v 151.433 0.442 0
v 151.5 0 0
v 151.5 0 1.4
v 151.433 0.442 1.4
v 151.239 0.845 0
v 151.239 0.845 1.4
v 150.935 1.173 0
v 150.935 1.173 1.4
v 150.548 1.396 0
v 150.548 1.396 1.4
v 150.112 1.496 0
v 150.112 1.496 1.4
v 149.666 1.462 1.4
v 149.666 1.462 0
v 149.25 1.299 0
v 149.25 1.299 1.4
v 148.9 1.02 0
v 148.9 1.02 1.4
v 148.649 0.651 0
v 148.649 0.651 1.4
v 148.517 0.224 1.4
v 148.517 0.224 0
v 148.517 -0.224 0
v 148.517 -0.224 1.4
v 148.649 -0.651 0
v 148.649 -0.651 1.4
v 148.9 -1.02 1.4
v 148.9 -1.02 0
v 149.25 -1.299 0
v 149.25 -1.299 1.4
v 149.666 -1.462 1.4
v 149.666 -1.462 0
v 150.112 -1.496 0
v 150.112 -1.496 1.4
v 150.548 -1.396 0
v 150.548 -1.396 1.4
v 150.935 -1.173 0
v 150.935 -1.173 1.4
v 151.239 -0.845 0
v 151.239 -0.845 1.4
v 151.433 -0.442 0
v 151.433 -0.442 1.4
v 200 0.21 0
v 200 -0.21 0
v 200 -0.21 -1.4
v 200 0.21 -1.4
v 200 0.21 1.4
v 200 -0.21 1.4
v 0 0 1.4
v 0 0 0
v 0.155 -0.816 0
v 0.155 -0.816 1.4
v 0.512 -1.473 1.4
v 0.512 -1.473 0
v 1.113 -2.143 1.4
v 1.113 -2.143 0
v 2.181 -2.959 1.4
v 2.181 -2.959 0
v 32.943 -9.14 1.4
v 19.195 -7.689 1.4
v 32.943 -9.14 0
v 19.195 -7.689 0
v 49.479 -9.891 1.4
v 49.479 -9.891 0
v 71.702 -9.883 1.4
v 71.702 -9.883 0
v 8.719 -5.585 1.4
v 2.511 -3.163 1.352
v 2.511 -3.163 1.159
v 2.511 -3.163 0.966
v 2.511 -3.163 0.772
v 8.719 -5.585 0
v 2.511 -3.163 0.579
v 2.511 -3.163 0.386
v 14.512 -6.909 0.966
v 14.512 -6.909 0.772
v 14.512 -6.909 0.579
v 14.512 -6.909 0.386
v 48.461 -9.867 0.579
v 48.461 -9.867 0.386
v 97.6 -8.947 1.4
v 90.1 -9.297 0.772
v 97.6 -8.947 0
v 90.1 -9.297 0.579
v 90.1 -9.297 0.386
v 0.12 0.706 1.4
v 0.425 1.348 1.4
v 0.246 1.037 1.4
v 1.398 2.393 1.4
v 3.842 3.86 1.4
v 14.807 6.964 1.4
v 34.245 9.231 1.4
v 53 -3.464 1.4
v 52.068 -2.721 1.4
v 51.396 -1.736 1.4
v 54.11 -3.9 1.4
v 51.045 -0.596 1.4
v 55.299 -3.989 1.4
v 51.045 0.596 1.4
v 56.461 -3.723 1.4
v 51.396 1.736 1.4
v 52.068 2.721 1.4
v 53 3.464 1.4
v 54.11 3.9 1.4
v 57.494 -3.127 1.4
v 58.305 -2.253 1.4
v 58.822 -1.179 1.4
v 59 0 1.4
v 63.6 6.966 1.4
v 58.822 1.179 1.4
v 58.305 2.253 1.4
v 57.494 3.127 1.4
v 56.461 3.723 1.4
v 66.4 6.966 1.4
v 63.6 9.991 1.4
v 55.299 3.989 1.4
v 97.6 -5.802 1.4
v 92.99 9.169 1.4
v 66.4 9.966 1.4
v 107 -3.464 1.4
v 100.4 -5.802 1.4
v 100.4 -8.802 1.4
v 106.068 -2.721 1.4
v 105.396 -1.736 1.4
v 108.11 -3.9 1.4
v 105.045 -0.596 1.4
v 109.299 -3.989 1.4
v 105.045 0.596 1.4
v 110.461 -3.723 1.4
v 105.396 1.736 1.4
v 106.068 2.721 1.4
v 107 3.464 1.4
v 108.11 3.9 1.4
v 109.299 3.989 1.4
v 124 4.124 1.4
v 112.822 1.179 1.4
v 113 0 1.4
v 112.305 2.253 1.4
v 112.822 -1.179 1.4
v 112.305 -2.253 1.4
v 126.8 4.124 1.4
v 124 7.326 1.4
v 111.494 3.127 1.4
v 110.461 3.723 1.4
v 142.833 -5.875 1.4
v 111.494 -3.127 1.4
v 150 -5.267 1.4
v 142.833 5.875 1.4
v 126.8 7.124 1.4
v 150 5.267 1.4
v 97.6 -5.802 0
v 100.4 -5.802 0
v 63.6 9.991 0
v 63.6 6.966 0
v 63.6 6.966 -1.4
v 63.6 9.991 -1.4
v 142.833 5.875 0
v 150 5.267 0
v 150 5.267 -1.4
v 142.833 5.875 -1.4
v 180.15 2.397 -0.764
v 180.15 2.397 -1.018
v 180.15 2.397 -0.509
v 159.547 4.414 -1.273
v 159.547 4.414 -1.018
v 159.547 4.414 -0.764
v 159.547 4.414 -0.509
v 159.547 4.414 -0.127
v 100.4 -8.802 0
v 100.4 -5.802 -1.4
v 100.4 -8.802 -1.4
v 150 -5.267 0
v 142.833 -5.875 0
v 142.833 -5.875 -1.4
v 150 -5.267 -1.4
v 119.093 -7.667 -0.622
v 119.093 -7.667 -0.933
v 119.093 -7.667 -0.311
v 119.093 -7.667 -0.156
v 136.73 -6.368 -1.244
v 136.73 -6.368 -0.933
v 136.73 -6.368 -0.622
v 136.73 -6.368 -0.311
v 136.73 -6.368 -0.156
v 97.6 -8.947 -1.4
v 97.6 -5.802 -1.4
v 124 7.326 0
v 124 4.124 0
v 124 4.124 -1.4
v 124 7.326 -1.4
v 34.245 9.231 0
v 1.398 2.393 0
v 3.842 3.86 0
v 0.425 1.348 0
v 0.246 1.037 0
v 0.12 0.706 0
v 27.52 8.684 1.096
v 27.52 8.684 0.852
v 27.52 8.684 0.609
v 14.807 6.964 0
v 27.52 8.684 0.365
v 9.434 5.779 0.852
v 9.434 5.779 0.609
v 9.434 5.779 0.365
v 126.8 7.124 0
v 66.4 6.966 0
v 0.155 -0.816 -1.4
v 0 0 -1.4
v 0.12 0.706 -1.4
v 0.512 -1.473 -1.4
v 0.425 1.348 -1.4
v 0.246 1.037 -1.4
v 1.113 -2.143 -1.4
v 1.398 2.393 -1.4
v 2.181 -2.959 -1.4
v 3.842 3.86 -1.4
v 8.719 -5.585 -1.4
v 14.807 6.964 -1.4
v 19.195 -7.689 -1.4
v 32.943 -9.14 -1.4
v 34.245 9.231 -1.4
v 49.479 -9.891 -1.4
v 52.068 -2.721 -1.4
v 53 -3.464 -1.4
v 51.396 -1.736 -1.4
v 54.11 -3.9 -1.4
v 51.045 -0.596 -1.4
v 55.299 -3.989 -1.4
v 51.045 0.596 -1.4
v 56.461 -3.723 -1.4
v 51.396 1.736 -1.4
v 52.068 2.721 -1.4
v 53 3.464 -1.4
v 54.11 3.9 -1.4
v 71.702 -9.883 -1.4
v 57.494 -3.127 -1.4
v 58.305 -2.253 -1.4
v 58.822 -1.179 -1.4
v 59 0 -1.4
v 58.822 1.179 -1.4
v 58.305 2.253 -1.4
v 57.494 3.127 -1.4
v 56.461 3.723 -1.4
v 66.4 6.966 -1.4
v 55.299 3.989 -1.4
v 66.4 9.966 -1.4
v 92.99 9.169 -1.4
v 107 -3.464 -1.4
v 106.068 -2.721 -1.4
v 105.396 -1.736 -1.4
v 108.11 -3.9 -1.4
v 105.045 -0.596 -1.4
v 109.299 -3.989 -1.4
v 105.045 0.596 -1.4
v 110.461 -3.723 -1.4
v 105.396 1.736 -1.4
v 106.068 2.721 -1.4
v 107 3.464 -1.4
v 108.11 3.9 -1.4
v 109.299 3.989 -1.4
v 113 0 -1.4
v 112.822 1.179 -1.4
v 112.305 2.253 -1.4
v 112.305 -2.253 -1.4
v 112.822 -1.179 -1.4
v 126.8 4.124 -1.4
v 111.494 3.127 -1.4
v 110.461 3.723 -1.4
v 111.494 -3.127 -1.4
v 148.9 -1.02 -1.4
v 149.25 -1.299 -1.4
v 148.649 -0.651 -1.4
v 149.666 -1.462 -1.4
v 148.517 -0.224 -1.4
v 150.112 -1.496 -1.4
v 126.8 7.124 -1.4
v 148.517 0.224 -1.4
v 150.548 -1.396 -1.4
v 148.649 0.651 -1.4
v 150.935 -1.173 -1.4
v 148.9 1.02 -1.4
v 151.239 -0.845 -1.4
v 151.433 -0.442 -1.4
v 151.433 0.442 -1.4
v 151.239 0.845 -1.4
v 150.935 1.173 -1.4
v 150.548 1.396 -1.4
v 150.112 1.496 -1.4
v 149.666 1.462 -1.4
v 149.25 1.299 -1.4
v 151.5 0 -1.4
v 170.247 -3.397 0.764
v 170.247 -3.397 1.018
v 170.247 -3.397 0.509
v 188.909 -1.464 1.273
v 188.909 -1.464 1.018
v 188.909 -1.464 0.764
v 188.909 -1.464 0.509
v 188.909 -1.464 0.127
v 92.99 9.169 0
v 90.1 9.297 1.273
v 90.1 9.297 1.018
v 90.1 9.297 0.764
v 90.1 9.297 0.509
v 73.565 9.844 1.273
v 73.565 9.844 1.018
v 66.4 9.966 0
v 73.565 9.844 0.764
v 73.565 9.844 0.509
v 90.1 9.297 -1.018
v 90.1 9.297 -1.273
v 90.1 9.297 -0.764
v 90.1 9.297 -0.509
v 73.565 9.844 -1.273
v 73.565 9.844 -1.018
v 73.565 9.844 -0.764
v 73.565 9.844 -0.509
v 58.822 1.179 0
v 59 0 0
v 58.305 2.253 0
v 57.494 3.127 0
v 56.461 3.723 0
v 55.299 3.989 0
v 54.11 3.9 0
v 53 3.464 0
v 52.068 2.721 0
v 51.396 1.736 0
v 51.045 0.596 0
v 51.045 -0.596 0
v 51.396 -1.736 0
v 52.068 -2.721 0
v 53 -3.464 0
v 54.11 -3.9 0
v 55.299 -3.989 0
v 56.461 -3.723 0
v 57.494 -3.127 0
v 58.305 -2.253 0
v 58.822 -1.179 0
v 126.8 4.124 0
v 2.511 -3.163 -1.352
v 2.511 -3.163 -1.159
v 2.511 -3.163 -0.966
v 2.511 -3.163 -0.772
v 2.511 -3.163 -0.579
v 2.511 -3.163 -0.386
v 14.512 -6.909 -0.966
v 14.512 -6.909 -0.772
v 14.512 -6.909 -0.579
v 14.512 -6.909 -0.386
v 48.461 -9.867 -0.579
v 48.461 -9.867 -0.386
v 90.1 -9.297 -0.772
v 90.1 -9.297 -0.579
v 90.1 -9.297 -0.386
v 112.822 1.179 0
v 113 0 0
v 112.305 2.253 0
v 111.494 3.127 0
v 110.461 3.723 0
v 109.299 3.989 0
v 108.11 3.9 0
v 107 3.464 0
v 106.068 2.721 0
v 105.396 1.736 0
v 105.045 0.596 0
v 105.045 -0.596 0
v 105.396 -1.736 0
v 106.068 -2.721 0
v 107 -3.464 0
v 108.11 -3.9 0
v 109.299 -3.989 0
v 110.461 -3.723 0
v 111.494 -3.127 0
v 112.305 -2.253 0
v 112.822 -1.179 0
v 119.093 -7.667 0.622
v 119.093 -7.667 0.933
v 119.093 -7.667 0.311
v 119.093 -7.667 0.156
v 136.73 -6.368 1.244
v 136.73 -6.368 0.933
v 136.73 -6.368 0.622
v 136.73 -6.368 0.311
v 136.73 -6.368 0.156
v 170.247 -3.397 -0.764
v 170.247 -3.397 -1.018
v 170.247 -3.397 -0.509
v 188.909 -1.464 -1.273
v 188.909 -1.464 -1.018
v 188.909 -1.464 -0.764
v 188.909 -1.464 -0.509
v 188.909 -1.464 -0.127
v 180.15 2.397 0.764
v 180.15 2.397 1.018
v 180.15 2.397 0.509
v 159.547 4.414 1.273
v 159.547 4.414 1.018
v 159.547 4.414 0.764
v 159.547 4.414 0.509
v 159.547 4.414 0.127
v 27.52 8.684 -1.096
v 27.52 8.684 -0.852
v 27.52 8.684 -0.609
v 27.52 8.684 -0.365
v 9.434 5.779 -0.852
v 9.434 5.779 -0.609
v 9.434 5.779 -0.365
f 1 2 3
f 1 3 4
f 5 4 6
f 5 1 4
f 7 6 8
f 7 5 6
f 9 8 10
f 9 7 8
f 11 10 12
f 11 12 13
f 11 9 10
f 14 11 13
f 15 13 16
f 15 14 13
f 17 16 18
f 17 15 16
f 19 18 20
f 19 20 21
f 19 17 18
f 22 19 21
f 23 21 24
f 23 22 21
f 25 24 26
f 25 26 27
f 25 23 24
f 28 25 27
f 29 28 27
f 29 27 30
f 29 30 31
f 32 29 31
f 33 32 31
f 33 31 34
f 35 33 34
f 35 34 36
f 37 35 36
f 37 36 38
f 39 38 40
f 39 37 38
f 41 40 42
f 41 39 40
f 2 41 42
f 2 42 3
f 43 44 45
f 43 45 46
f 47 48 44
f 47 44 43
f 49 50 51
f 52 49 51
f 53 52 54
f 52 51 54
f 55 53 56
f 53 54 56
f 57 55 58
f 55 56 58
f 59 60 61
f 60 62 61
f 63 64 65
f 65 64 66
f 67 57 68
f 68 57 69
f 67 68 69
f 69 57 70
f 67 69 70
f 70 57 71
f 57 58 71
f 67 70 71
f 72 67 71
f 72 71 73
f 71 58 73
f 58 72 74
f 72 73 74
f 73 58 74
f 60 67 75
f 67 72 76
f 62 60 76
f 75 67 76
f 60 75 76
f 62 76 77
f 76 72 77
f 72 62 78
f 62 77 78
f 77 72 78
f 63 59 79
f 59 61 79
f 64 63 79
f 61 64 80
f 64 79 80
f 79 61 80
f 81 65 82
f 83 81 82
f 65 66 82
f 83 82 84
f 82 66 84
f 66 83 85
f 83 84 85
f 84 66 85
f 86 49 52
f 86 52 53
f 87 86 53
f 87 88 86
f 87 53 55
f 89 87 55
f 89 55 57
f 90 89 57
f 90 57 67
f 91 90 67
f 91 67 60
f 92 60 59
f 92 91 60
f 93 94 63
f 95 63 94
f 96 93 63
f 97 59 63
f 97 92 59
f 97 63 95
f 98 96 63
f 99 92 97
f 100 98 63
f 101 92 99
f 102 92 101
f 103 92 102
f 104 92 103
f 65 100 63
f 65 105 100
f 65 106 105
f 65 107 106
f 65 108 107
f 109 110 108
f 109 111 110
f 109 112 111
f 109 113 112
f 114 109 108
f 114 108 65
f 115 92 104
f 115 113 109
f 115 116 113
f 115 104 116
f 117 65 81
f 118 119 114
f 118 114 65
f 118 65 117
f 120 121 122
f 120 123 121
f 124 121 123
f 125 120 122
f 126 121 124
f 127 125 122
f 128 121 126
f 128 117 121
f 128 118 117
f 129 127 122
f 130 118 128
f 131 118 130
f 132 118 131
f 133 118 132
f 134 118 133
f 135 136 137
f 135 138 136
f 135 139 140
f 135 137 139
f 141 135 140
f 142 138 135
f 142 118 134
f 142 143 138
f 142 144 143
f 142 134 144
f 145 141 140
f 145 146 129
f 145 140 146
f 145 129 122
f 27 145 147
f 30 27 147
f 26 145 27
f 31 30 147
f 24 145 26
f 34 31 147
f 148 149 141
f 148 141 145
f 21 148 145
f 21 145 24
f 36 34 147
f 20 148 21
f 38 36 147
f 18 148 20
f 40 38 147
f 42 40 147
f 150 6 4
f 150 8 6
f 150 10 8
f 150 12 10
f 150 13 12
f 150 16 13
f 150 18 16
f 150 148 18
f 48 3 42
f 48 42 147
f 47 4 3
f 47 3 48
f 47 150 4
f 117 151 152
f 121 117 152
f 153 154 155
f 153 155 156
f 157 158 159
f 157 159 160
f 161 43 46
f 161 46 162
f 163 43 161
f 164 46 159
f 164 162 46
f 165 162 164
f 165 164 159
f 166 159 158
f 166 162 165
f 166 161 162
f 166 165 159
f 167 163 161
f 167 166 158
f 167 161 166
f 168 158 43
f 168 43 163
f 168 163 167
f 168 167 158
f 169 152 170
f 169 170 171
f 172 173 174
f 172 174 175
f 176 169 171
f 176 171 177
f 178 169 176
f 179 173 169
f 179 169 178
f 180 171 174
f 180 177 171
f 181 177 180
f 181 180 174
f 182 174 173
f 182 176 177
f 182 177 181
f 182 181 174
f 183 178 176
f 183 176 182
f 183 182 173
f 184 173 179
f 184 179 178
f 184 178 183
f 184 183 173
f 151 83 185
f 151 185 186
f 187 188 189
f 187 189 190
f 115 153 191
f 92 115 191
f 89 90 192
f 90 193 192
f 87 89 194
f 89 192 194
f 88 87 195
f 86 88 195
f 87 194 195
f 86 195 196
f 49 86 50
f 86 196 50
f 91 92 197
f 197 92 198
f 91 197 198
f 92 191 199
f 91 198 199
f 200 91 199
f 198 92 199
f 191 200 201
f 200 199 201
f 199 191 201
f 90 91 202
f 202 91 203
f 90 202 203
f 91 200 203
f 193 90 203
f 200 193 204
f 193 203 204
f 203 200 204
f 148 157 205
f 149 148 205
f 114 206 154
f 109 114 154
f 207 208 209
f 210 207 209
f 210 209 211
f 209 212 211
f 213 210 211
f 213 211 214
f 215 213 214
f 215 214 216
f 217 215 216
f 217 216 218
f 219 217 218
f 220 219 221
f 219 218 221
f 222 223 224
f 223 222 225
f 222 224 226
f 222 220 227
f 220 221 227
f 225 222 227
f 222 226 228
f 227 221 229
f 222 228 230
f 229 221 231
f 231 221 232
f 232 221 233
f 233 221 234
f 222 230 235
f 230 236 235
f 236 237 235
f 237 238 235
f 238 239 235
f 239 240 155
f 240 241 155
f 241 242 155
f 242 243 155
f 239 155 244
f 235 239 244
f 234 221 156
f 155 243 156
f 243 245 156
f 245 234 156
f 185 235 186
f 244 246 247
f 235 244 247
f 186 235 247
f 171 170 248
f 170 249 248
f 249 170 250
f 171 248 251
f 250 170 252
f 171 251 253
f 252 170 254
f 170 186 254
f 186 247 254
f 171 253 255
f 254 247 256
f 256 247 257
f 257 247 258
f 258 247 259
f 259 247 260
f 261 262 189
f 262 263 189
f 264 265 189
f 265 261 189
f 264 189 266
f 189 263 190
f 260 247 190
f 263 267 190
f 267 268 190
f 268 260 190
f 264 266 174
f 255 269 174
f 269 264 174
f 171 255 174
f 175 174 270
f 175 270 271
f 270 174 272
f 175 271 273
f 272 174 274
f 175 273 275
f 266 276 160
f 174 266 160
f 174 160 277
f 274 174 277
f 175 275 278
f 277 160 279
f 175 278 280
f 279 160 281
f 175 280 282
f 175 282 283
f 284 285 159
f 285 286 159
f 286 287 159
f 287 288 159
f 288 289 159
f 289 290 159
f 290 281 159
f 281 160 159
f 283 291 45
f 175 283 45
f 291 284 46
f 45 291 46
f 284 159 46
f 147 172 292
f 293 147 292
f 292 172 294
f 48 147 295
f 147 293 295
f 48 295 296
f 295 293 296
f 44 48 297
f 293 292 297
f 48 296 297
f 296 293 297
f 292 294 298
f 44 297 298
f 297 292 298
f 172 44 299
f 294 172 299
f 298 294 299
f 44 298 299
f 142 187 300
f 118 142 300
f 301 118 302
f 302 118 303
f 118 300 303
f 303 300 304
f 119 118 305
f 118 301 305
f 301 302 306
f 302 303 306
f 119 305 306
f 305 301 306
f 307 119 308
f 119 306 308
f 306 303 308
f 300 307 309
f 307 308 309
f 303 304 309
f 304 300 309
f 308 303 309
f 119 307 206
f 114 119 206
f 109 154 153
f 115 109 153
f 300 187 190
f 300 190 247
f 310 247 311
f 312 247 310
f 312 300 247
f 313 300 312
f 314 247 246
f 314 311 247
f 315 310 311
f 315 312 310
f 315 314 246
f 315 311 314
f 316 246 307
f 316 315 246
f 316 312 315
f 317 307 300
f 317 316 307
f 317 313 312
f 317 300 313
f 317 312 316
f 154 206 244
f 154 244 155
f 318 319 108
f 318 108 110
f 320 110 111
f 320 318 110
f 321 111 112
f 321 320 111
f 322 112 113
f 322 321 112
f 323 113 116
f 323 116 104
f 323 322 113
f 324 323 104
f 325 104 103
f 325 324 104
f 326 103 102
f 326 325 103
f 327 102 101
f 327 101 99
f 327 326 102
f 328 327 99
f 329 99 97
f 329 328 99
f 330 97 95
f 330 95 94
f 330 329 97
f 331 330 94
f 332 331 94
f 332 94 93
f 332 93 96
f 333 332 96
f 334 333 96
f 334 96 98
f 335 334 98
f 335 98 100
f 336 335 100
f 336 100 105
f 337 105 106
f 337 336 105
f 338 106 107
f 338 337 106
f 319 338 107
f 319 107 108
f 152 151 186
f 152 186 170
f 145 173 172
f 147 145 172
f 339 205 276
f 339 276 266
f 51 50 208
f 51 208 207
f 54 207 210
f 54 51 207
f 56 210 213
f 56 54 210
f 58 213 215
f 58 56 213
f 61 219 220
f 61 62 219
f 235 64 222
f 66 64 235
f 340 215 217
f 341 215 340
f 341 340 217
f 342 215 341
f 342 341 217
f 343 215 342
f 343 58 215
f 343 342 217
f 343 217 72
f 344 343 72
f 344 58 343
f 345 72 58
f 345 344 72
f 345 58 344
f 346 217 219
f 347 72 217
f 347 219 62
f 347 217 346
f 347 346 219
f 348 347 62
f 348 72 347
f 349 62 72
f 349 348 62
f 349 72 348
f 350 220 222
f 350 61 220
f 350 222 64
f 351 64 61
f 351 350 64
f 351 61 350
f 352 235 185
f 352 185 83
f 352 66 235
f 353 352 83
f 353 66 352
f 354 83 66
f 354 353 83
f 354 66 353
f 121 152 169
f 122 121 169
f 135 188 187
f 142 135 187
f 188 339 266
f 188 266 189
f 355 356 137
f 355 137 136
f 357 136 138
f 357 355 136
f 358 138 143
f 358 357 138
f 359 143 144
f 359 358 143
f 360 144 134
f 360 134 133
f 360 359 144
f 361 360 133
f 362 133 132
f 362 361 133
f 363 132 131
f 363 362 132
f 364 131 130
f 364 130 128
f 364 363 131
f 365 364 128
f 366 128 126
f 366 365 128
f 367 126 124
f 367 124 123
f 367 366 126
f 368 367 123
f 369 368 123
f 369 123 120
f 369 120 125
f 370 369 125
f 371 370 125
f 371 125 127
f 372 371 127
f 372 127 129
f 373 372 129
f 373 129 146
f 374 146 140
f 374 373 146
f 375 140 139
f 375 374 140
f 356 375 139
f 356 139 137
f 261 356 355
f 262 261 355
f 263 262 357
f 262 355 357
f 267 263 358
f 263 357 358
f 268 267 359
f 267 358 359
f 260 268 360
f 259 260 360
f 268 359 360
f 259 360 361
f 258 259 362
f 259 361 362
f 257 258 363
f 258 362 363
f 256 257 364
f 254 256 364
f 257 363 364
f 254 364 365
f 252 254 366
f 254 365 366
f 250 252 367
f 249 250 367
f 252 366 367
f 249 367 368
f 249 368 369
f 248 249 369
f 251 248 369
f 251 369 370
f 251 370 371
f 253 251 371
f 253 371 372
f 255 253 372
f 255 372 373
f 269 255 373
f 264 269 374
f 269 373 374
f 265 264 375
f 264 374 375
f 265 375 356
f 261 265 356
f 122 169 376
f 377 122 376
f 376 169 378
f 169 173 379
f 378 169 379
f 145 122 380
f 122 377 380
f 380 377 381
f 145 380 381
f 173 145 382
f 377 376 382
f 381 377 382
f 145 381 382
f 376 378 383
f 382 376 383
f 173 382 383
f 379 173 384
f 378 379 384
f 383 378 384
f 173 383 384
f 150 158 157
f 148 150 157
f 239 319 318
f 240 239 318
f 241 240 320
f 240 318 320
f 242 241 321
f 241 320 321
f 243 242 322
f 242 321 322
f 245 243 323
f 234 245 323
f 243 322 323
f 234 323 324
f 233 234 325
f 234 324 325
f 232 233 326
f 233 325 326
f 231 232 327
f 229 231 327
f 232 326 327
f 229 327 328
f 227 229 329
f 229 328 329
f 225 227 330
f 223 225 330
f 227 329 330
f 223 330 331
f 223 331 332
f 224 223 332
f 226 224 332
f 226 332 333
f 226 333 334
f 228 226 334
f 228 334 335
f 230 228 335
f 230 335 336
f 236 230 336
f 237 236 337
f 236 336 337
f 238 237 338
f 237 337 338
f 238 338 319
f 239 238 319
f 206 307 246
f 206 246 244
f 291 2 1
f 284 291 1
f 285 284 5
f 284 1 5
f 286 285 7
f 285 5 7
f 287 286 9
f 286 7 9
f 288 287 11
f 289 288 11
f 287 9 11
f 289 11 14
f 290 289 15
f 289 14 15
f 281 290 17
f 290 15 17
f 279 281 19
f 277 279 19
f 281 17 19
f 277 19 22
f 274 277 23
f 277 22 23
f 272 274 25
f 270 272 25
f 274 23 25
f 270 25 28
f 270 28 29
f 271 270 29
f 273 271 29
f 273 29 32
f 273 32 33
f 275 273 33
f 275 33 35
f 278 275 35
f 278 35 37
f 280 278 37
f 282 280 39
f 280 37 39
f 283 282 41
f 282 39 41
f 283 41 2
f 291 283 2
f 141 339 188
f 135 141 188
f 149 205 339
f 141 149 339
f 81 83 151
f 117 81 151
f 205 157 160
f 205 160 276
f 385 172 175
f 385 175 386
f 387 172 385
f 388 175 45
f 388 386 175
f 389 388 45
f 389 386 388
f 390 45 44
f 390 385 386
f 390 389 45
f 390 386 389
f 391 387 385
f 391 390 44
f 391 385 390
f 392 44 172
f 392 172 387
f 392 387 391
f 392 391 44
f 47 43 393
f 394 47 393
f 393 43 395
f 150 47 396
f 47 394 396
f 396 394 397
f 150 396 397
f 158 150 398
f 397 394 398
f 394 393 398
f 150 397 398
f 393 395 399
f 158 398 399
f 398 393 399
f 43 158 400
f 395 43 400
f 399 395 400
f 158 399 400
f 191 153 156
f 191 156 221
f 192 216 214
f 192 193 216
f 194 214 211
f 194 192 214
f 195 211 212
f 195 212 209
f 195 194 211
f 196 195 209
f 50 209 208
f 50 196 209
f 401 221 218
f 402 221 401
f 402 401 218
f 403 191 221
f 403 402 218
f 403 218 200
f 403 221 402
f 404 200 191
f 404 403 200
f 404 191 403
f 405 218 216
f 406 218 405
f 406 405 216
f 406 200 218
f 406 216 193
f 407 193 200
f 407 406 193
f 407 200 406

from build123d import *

# Parameters (mm, degrees)
SKETCH_3_R      = 4
SKETCH_3_R_2    = 1.5
EXTRUDE_1_DEPTH = 1.4


with BuildPart() as part:
    # Эскиз3 → Бобышка-Вытянуть1 (new, symmetric)
    # profile 1 of 3: a face of its own
    with BuildSketch(Plane.XY):
        with BuildLine():
            ThreePointArc((142.832679674, -5.874542072), (140.732814602, 0), (142.832679674, 5.874542072))
            add(Edge.make_bspline(
                [(142.832679674, 5.874542072), (142.738367078, 5.882342313), (140.704418314, 6.050397669), (136.716836604, 6.372892076), (131.466708661, 6.779317653), (128.156255998, 7.025385403), (126.8, 7.124412105)],
                knots=[0.283155863, 0.283155863, 0.283155863, 0.283155863, 0.284555151, 0.313332763, 0.342309554, 0.362416837, 0.362416837, 0.362416837, 0.362416837], degree=3))
            Line((126.8, 7.124412105), (126.8, 4.124412105))
            Line((126.8, 4.124412105), (124, 4.124412105))
            Line((124, 4.124412105), (124, 7.326294797))
            add(Edge.make_bspline(
                [(124, 7.326294797), (122.364596134, 7.442700413), (118.769611386, 7.692718614), (113.223109349, 8.057497647), (107.374551667, 8.416266925), (101.566628903, 8.744829808), (95.813307617, 9.040711105), (90.127882502, 9.301433286), (84.52309051, 9.524657051), (79.011121778, 9.708185508), (73.603706202, 9.849984193), (69.41154014, 9.927778606), (67.023185068, 9.958531818), (66.4, 9.965595937)],
                knots=[0.376253135, 0.376253135, 0.376253135, 0.376253135, 0.400495752, 0.429537687, 0.458441906, 0.487136113, 0.515551917, 0.543623846, 0.571289984, 0.59849081, 0.625169613, 0.651272029, 0.660487149, 0.660487149, 0.660487149, 0.660487149], degree=3))
            Line((66.4, 9.965595937), (66.4, 6.965595937))
            Line((66.4, 6.965595937), (63.6, 6.965595937))
            Line((63.6, 6.965595937), (63.6, 9.990751447))
            add(Edge.make_bspline(
                [(63.599999999, 9.990751447), (63.433767139, 9.991846739), (61.590618822, 10.003190391), (58.119580475, 10.007674079), (53.239340889, 9.96650448), (48.51637403, 9.877065972), (43.960263434, 9.738807032), (39.580313292, 9.551735955), (35.385580653, 9.316092874), (31.384869897, 9.032475932), (27.586779877, 8.701741845), (23.999672572, 8.325205071), (20.631718928, 7.904294519), (17.490877441, 7.44078362), (14.58489291, 6.936612431), (11.921305119, 6.393879384), (9.507426038, 5.81478546), (7.350195056, 5.201638101), (5.45639967, 4.556541724), (3.831515725, 3.88154028), (2.48215991, 3.178007515), (1.407454518, 2.445359098), (0.62379252, 1.678905598), (0.100633198, 0.863800259), (0.032444913, 0.278495812), (0, 0)],
                knots=[0.674288155, 0.674288155, 0.674288155, 0.674288155, 0.676746158, 0.701541791, 0.725611017, 0.748907835, 0.771387785, 0.793008139, 0.813728033, 0.833507815, 0.852309696, 0.87009731, 0.886835918, 0.902492782, 0.917037139, 0.930441054, 0.942679762, 0.953733567, 0.963589785, 0.972247019, 0.979722225, 0.986065145, 0.991385258, 0.995900989, 1, 1, 1, 1], degree=3))
            add(Edge.make_bspline(
                [(0, 0), (0.032444913, -0.278495812), (0.100633198, -0.863800259), (0.62379252, -1.678905598), (1.407454518, -2.445359098), (2.48215991, -3.178007515), (3.831515725, -3.88154028), (5.45639967, -4.556541724), (7.350195056, -5.201638101), (9.507426038, -5.81478546), (11.921305119, -6.393879384), (14.58489291, -6.936612431), (17.490877441, -7.44078362), (20.631718928, -7.904294519), (23.999672572, -8.325205071), (27.586779877, -8.701741845), (31.384869897, -9.032475932), (35.385580653, -9.316092874), (39.580313292, -9.551735955), (43.960263434, -9.738807032), (48.51637403, -9.877065972), (53.239340889, -9.96650448), (58.119580475, -10.007674079), (63.147232299, -10.001179647), (68.312112852, -9.948180779), (73.603706202, -9.849984193), (79.011121778, -9.708185508), (84.52309051, -9.524657051), (90.127882502, -9.301433286), (94.497039971, -9.101072496), (96.996632606, -8.97732649), (97.6, -8.946938935)],
                knots=[0, 0, 0, 0, 0.004099011, 0.008614742, 0.013934855, 0.020277775, 0.027752981, 0.036410215, 0.046266433, 0.057320238, 0.069558946, 0.082962861, 0.097507218, 0.113164082, 0.12990269, 0.147690304, 0.166492185, 0.186271967, 0.206991861, 0.228612215, 0.251092165, 0.274388983, 0.298458209, 0.323253842, 0.348727971, 0.374830387, 0.40150919, 0.428710016, 0.456376154, 0.484448083, 0.493380908, 0.493380908, 0.493380908, 0.493380908], degree=3))
            Line((97.6, -8.946938935), (97.6, -5.802264))
            Line((97.6, -5.802264), (100.4, -5.802264))
            Line((100.4, -5.802264), (100.4, -8.802264))
            add(Edge.make_bspline(
                [(100.4, -8.802264), (100.782530515, -8.78200637), (103.102887785, -8.657921344), (107.374551667, -8.416266925), (113.223109349, -8.057497647), (119.097620698, -7.671146294), (124.98256269, -7.259840679), (130.861479372, -6.826169971), (136.716836604, -6.372892076), (140.704418314, -6.050397669), (142.738367078, -5.882342313), (142.832679674, -5.874542072)],
                knots=[0.507199784, 0.507199784, 0.507199784, 0.507199784, 0.512863887, 0.541558094, 0.570462313, 0.599504248, 0.628607349, 0.657690446, 0.686667237, 0.715444849, 0.716844137, 0.716844137, 0.716844137, 0.716844137], degree=3))
        make_face()
        with Locations((55, 0)):
            Circle(SKETCH_3_R, mode=Mode.SUBTRACT)
        with Locations((109, 0)):
            Circle(SKETCH_3_R, mode=Mode.SUBTRACT)
    # profile 2 of 3: a face of its own
    with BuildSketch(Plane.XY):
        with BuildLine():
            ThreePointArc((150, -5.267185398), (144.732814602, 0), (150, 5.267185398))
            add(Edge.make_bspline(
                [(150, 5.267185398), (149.435842895, 5.316128425), (147.047047026, 5.522238119), (144.657842763, 5.723589679), (142.832679674, 5.874542072)],
                knots=[0.247703369, 0.247703369, 0.247703369, 0.247703369, 0.256076454, 0.283155863, 0.283155863, 0.283155863, 0.283155863], degree=3))
            ThreePointArc((142.832679674, 5.874542072), (140.732814602, 0), (142.832679674, -5.874542072))
            add(Edge.make_bspline(
                [(142.832679674, -5.874542072), (144.657842763, -5.723589679), (147.047047026, -5.522238119), (149.435842895, -5.316128425), (150, -5.267185398)],
                knots=[0.716844137, 0.716844137, 0.716844137, 0.716844137, 0.743923546, 0.752296631, 0.752296631, 0.752296631, 0.752296631], degree=3))
        make_face()
    # profile 3 of 3: a face of its own
    with BuildSketch(Plane.XY):
        with BuildLine():
            Line((200, -0.21), (200, 0.21))
            add(Edge.make_bspline(
                [(200, 0.21), (199.520051416, 0.265971644), (198.179524953, 0.422303954), (195.747560944, 0.701689979), (192.530784687, 1.065063842), (188.771568451, 1.480695182), (184.58704572, 1.932479181), (180.05616868, 2.409243063), (175.238405485, 2.90257428), (168.371896377, 3.585728287), (161.260104983, 4.261418012), (154.510064634, 4.872380257), (151.327214442, 5.152043902), (150, 5.267185398)],
                knots=[0, 0, 0, 0, 0.007144724, 0.019955661, 0.036196061, 0.055011184, 0.075878938, 0.098428866, 0.122375554, 0.147487885, 0.200459747, 0.22800517, 0.247703369, 0.247703369, 0.247703369, 0.247703369], degree=3))
            ThreePointArc((150, 5.267185398), (144.732814602, 0), (150, -5.267185398))
            add(Edge.make_bspline(
                [(150, -5.267185398), (151.327214442, -5.152043902), (154.510064634, -4.872380257), (161.260104983, -4.261418012), (168.371896377, -3.585728287), (175.238405485, -2.90257428), (180.05616868, -2.409243063), (184.58704572, -1.932479181), (188.771568451, -1.480695182), (192.530784687, -1.065063842), (195.747560944, -0.701689979), (198.179524953, -0.422303954), (199.520051416, -0.265971644), (200, -0.21)],
                knots=[0.752296631, 0.752296631, 0.752296631, 0.752296631, 0.77199483, 0.799540253, 0.852512115, 0.877624446, 0.901571134, 0.924121062, 0.944988816, 0.963803939, 0.980044339, 0.992855276, 1, 1, 1, 1], degree=3))
        make_face()
        with Locations((150, 0)):
            Circle(SKETCH_3_R_2, mode=Mode.SUBTRACT)
    extrude(amount=EXTRUDE_1_DEPTH, both=True)


solid = part.part
